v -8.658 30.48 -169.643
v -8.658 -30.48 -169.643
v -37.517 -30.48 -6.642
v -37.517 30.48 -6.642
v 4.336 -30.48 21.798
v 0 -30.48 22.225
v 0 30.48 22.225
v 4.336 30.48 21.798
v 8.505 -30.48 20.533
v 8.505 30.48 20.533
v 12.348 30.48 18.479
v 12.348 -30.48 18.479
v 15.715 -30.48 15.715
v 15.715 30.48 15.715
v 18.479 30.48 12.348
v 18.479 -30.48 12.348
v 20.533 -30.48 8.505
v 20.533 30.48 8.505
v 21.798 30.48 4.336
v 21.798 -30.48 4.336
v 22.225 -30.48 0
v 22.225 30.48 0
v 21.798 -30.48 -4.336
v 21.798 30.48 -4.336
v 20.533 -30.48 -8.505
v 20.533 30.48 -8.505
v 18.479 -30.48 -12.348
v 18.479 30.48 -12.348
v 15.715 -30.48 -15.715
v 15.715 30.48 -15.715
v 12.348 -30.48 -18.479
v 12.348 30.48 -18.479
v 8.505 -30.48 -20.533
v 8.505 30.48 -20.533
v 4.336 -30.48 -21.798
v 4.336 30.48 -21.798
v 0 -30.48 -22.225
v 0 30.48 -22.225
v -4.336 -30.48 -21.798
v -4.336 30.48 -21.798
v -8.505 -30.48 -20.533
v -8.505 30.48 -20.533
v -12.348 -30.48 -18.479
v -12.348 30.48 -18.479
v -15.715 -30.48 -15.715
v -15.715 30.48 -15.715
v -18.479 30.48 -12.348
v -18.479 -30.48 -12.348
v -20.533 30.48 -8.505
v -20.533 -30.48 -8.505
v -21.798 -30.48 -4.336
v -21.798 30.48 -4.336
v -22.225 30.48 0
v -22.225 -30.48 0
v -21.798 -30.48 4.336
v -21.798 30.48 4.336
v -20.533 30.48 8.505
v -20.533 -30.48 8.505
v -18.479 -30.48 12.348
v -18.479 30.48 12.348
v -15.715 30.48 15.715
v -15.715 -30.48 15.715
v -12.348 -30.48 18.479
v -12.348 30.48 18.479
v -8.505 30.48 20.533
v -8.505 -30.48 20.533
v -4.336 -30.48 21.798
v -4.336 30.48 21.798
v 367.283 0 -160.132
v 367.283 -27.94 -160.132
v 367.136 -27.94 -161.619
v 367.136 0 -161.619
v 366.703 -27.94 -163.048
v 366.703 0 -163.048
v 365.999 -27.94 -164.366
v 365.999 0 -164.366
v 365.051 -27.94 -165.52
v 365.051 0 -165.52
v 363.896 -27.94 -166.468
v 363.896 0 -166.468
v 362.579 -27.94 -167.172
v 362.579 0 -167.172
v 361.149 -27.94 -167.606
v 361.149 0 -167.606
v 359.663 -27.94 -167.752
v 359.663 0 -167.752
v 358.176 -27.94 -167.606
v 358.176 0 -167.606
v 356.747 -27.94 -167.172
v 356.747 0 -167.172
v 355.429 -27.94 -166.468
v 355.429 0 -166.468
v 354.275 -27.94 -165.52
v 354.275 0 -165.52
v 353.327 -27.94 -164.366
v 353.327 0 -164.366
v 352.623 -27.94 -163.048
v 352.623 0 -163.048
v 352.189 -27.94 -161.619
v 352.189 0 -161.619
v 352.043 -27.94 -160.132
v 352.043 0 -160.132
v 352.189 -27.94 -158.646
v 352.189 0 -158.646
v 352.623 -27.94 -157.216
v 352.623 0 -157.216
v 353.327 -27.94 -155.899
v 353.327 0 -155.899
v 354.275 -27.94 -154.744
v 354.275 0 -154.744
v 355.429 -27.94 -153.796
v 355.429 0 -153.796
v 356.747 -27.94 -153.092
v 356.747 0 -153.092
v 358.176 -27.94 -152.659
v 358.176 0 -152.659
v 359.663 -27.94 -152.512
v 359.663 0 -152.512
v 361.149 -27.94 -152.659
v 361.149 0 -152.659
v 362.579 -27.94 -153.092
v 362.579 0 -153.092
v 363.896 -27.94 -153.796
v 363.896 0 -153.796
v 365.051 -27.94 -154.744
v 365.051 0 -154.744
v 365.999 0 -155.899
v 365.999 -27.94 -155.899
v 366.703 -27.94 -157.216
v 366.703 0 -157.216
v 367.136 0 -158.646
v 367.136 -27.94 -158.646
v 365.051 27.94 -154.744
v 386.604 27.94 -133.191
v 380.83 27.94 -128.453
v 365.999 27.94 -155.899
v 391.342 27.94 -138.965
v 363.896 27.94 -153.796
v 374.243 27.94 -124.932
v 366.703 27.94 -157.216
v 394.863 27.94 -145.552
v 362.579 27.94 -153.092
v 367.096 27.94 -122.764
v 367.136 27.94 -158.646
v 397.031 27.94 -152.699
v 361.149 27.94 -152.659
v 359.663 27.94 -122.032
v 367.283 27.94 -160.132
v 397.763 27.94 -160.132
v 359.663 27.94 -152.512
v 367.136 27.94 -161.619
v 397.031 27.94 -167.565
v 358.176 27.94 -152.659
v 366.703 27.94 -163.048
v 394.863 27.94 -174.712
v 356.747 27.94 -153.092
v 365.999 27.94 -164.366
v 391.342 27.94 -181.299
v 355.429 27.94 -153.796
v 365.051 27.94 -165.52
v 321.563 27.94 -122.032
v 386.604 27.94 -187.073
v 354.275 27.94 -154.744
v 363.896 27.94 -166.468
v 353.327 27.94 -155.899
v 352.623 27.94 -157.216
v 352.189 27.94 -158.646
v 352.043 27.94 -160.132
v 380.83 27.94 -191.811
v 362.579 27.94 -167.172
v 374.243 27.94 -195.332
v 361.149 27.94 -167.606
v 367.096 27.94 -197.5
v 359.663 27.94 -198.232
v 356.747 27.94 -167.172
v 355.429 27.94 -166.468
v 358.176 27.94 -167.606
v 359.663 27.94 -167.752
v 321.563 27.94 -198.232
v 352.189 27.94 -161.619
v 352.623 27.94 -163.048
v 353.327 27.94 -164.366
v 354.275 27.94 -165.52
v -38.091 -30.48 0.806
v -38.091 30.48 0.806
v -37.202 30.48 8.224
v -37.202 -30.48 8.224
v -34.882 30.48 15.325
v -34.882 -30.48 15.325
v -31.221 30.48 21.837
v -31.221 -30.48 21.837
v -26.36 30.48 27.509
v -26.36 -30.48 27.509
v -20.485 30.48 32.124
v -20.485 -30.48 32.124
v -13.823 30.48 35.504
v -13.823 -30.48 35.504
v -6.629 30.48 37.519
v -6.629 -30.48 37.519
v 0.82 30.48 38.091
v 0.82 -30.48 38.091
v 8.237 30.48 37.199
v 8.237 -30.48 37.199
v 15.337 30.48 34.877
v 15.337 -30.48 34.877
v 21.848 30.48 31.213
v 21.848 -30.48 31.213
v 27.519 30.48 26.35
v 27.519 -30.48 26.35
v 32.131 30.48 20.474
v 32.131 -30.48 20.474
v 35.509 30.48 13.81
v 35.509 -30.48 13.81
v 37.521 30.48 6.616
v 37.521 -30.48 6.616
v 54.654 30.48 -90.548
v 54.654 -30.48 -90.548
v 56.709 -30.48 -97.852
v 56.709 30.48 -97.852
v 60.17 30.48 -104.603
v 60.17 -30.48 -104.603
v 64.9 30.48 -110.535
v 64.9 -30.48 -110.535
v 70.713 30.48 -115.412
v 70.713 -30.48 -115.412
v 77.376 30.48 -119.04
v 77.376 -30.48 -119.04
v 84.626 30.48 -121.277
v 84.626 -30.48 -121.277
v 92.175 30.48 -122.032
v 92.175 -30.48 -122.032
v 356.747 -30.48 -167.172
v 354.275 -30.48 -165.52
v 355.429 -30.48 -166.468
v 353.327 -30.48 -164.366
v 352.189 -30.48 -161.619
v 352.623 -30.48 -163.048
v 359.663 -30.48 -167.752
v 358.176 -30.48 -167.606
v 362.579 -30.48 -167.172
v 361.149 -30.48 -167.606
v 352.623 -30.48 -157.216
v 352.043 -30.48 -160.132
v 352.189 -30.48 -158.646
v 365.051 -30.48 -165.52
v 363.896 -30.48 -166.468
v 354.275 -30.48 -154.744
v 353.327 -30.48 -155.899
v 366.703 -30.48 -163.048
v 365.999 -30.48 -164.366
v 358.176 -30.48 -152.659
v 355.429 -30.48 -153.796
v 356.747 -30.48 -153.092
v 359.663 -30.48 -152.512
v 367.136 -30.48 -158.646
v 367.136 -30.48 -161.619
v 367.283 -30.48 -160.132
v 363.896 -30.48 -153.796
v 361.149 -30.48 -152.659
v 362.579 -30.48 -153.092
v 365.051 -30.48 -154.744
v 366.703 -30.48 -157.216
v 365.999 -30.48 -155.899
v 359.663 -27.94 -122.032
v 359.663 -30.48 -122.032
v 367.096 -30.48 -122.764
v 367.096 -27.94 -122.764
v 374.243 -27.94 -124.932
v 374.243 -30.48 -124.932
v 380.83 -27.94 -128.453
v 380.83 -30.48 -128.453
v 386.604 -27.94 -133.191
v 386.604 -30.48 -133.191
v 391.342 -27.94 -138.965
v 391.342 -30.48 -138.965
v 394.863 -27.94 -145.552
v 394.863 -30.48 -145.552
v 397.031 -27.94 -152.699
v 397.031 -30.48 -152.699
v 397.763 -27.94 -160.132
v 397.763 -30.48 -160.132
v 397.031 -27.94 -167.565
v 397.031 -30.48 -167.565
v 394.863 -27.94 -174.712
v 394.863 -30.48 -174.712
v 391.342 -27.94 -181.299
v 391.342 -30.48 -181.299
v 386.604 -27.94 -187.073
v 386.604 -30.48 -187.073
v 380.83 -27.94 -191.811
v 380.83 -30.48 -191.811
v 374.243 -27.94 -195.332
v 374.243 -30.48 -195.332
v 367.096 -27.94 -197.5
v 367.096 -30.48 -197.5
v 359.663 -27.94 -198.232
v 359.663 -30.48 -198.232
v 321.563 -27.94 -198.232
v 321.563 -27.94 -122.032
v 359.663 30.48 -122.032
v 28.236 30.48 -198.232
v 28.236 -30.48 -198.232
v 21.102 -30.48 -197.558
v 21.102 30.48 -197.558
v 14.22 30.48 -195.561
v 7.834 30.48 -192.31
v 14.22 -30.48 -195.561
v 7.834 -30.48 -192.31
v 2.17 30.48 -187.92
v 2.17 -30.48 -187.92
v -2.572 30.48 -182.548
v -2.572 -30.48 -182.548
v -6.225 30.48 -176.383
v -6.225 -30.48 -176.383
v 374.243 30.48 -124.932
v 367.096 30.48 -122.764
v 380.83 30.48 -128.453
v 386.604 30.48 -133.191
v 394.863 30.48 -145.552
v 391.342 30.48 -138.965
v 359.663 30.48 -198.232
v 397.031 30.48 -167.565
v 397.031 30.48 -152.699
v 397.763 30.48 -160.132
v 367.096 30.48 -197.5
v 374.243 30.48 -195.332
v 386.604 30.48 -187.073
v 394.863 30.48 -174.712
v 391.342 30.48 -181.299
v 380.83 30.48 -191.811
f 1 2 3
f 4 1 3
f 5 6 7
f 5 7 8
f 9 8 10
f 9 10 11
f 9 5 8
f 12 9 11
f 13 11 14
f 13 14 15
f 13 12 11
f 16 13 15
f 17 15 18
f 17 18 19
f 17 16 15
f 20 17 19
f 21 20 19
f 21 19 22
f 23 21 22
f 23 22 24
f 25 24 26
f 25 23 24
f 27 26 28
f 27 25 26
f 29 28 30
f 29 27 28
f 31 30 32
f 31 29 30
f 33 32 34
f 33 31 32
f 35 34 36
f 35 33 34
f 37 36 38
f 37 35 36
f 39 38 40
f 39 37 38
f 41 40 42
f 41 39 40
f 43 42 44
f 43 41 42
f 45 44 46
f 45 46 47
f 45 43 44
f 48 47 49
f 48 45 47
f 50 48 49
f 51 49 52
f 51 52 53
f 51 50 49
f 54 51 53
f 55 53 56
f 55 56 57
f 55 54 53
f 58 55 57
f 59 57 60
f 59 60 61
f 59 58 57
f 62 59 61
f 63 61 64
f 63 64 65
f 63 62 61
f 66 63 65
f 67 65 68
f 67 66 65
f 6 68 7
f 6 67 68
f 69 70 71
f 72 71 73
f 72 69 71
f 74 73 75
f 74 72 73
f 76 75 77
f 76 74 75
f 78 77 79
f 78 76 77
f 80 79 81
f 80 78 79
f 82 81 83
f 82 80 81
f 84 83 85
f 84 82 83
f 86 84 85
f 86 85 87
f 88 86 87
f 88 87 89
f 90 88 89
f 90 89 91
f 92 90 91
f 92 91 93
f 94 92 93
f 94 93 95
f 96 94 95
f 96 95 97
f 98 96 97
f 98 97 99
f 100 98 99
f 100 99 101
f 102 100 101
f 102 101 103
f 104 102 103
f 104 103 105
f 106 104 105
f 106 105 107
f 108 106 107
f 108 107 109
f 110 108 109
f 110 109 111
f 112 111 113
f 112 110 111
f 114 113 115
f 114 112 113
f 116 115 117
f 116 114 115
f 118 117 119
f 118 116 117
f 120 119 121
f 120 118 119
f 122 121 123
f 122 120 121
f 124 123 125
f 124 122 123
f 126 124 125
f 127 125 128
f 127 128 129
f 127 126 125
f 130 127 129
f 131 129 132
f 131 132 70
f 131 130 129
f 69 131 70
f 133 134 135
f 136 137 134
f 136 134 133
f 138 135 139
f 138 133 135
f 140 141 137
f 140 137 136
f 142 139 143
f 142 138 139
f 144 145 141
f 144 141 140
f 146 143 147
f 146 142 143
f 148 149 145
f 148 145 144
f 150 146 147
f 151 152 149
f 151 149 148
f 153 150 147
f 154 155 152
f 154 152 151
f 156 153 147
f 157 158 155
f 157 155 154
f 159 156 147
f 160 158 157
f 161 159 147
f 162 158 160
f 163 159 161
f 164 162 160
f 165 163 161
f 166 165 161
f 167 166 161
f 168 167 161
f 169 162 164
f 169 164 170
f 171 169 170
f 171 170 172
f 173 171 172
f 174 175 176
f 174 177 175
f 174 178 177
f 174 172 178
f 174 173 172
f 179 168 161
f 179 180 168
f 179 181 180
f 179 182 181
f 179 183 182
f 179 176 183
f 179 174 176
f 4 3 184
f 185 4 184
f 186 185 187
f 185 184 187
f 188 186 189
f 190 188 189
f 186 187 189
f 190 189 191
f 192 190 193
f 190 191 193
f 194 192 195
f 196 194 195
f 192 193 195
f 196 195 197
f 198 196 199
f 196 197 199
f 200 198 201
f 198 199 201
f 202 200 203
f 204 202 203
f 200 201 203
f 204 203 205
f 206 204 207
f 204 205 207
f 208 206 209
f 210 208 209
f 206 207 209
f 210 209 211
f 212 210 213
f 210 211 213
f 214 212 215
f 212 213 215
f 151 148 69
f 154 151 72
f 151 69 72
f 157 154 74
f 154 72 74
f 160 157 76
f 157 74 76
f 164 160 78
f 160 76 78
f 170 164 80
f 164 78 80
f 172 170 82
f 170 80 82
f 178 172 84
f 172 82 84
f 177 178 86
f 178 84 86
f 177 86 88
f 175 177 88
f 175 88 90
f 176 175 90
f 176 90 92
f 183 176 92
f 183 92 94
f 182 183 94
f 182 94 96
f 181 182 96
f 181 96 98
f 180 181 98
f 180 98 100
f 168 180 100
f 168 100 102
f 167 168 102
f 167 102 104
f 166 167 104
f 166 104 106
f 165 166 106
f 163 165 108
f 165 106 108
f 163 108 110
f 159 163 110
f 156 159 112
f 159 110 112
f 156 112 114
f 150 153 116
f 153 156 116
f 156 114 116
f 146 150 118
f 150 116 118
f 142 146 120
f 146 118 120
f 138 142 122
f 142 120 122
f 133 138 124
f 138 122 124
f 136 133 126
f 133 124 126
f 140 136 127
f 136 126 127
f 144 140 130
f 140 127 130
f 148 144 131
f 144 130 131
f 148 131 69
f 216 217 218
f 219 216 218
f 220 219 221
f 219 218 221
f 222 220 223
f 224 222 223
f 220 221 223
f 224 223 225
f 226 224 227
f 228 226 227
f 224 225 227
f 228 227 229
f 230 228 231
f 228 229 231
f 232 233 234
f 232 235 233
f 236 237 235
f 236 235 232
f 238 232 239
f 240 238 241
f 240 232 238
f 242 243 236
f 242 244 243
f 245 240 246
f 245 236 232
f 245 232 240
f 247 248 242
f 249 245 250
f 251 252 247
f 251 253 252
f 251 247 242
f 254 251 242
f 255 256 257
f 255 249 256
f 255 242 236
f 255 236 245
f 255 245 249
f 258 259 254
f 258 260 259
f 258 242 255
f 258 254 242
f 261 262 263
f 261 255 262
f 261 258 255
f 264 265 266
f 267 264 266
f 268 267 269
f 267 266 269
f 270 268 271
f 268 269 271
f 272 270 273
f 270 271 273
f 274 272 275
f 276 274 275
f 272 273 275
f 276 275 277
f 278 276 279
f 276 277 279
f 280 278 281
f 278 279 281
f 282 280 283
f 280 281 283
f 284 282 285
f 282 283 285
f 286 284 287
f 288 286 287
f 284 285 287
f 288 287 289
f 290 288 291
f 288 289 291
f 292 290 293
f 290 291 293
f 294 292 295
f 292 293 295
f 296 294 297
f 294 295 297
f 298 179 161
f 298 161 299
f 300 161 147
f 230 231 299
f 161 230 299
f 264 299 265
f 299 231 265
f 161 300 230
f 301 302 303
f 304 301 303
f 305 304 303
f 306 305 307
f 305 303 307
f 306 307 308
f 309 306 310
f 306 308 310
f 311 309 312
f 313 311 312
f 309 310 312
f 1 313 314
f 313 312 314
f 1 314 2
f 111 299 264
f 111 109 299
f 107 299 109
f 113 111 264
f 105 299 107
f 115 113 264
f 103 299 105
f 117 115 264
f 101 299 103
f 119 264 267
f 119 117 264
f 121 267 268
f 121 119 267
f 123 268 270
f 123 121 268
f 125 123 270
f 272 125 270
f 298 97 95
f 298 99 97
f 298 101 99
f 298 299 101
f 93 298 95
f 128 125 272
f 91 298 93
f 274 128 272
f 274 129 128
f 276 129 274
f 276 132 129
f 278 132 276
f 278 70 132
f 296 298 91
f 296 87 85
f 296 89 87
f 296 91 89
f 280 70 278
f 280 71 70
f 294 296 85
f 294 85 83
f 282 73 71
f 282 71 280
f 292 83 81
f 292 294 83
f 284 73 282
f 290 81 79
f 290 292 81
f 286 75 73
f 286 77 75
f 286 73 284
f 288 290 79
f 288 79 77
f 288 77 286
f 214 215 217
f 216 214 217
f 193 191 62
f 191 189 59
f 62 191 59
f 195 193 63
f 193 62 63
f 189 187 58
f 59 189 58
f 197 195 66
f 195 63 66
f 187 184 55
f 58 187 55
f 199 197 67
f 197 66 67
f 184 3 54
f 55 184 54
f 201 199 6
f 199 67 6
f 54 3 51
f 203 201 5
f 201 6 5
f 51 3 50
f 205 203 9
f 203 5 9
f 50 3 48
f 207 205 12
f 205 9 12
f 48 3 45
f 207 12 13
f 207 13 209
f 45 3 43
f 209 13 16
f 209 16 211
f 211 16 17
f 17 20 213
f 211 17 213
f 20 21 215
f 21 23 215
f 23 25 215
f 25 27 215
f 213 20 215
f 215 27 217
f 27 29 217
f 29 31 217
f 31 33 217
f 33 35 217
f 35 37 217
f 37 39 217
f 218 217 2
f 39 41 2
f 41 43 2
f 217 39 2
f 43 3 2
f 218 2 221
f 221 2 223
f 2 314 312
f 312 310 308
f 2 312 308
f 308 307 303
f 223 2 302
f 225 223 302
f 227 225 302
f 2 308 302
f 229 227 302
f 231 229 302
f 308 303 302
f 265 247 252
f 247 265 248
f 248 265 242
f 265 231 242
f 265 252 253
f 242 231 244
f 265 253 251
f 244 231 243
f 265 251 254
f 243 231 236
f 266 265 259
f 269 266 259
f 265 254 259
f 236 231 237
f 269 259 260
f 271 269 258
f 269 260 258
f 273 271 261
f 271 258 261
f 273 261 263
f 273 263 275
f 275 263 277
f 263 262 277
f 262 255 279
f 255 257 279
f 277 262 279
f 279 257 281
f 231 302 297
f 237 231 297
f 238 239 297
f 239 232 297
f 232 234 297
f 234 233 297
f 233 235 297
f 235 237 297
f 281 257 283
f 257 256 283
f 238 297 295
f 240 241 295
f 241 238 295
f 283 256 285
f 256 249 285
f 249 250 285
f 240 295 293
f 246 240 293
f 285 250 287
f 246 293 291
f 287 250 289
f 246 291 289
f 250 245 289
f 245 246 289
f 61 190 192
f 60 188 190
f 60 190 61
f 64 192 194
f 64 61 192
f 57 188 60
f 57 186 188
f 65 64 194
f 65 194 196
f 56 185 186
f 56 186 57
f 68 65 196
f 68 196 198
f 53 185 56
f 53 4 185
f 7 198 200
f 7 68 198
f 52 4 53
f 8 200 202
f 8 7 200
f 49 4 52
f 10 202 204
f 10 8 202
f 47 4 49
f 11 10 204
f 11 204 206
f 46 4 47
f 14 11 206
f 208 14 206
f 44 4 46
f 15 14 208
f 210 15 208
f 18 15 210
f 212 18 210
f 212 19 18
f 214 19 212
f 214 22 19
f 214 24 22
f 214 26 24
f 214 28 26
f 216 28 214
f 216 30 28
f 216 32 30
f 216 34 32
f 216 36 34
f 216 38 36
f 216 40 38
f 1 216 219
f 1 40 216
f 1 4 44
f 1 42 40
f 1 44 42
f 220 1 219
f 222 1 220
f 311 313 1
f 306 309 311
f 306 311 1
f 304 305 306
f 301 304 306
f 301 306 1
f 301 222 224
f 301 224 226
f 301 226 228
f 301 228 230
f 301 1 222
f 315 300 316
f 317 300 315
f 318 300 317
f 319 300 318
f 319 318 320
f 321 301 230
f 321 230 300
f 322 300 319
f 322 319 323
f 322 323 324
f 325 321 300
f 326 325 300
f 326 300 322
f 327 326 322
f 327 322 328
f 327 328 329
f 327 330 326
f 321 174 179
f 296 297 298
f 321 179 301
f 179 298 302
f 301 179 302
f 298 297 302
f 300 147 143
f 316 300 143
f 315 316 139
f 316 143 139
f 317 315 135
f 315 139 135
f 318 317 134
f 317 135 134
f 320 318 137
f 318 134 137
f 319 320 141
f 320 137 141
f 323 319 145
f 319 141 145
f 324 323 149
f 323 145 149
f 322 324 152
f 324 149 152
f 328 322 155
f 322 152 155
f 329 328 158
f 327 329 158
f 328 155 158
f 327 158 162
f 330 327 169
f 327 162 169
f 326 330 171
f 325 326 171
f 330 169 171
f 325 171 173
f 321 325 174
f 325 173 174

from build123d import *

# Parameters (mm, degrees)
BOSS_EXTRUDE1_DEPTH             = 30.48
BOSS_EXTRUDE1_DEPTH_BACK        = 30.48
SKETCH1_R                       = 22.225
SKETCH1_R_2                     = 7.62
CUT_EXTRUDE2_DEPTH              = 76.2
BOSS_EXTRUDE3_REACH             = 447.466
SKETCH5_R                       = 7.62
BOSS_EXTRUDE3_DIRECTION_2_REACH = 447.466


with BuildPart() as part:
    # Sketch1 → Boss-Extrude1 (new, two sides: drawn at the far end of the back side and taken through both)
    with BuildSketch(Plane(origin=(0, 0, 0), x_dir=(1, 0, 0), z_dir=(0, 1, 0)).offset(-BOSS_EXTRUDE1_DEPTH_BACK)):
        with BuildLine():
            Line((359.662846674, 198.232216379), (28.235630228, 198.232216379))
            ThreePointArc((28.235630228, 198.232216379), (4.898580527, 190.2485261), (-8.658113435, 169.643350826))
            Line((-8.658113435, 169.643350826), (-37.51656391, 6.642095481))
            ThreePointArc((-37.51656391, 6.642095481), (-6.629045926, -37.518871919), (37.52117539, -6.615995569))
            Line((37.52117539, -6.615995569), (54.653846734, 90.548211948))
            ThreePointArc((54.653846734, 90.548211948), (67.684814195, 113.118509662), (92.175022124, 122.032216379))
            Line((92.175022124, 122.032216379), (359.662846674, 122.032216379))
            ThreePointArc((359.662846674, 122.032216379), (397.762846674, 160.132216379), (359.662846674, 198.232216379))
        make_face()
        with Locations(Location((0, 0, 0), (0, 0, 270))):
            Circle(SKETCH1_R, mode=Mode.SUBTRACT)
        with Locations(Location((359.662846674, 160.132216379, 0), (0, 0, 270))):
            Circle(SKETCH1_R_2, mode=Mode.SUBTRACT)
    extrude(amount=BOSS_EXTRUDE1_DEPTH + BOSS_EXTRUDE1_DEPTH_BACK)

    # Sketch4 → Cut-Extrude2 (cut)
    with BuildSketch(Plane(origin=(0, 0, -198.232216379), x_dir=(-1, 0, 0), z_dir=(0, 0, -1))):
        Polygon((-397.762846674, 0), (-397.762846674, 27.94), (-321.562846674, 27.94), (-321.562846674, -27.94), (-397.762846674, -27.94), align=None)
    extrude(amount=-CUT_EXTRUDE2_DEPTH, mode=Mode.SUBTRACT)

    # Boss-Extrude3: up to this face of the body (flat: up to its plane)
    boss_extrude3_end = Plane(part.part.faces().sort_by_distance((144.088603617, 30.48, -132.672626022))[0])
    # Sketch5 → Boss-Extrude3 (add, up to the picked face)
    with BuildSketch(Plane(origin=(0, 0, 0), x_dir=(1, 0, 0), z_dir=(0, 1, 0)), mode=Mode.PRIVATE) as boss_extrude3_sk1:
        with Locations((359.662846674, 160.132216379)):
            Circle(SKETCH5_R)
    boss_extrude3_tool1 = split(extrude(boss_extrude3_sk1.sketch, amount=BOSS_EXTRUDE3_REACH, mode=Mode.PRIVATE), bisect_by=boss_extrude3_end, keep=Keep.BOTH, mode=Mode.PRIVATE)
    add(boss_extrude3_tool1.solids().sort_by(Axis((359.662847, 0, -160.132216), (0, 1, 0)))[0])

    # Boss-Extrude3 direction 2: up to this face of the body (flat: up to its plane)
    boss_extrude3_direction_2_end = Plane(part.part.faces().sort_by_distance((144.088603617, -30.48, -132.672626022))[0])
    # Sketch5 → Boss-Extrude3 direction 2 (add, up to the picked face)
    with BuildSketch(Plane(origin=(0, 0, 0), x_dir=(1, 0, 0), z_dir=(0, 1, 0)), mode=Mode.PRIVATE) as boss_extrude3_direction_2_sk1:
        with Locations((359.662846674, 160.132216379)):
            Circle(SKETCH5_R)
    boss_extrude3_direction_2_tool1 = split(extrude(boss_extrude3_direction_2_sk1.sketch, amount=-BOSS_EXTRUDE3_DIRECTION_2_REACH, mode=Mode.PRIVATE), bisect_by=boss_extrude3_direction_2_end, keep=Keep.BOTH, mode=Mode.PRIVATE)
    add(boss_extrude3_direction_2_tool1.solids().sort_by(Axis((359.662847, 0, -160.132216), (0, -1, 0)))[0])


solid = part.part
